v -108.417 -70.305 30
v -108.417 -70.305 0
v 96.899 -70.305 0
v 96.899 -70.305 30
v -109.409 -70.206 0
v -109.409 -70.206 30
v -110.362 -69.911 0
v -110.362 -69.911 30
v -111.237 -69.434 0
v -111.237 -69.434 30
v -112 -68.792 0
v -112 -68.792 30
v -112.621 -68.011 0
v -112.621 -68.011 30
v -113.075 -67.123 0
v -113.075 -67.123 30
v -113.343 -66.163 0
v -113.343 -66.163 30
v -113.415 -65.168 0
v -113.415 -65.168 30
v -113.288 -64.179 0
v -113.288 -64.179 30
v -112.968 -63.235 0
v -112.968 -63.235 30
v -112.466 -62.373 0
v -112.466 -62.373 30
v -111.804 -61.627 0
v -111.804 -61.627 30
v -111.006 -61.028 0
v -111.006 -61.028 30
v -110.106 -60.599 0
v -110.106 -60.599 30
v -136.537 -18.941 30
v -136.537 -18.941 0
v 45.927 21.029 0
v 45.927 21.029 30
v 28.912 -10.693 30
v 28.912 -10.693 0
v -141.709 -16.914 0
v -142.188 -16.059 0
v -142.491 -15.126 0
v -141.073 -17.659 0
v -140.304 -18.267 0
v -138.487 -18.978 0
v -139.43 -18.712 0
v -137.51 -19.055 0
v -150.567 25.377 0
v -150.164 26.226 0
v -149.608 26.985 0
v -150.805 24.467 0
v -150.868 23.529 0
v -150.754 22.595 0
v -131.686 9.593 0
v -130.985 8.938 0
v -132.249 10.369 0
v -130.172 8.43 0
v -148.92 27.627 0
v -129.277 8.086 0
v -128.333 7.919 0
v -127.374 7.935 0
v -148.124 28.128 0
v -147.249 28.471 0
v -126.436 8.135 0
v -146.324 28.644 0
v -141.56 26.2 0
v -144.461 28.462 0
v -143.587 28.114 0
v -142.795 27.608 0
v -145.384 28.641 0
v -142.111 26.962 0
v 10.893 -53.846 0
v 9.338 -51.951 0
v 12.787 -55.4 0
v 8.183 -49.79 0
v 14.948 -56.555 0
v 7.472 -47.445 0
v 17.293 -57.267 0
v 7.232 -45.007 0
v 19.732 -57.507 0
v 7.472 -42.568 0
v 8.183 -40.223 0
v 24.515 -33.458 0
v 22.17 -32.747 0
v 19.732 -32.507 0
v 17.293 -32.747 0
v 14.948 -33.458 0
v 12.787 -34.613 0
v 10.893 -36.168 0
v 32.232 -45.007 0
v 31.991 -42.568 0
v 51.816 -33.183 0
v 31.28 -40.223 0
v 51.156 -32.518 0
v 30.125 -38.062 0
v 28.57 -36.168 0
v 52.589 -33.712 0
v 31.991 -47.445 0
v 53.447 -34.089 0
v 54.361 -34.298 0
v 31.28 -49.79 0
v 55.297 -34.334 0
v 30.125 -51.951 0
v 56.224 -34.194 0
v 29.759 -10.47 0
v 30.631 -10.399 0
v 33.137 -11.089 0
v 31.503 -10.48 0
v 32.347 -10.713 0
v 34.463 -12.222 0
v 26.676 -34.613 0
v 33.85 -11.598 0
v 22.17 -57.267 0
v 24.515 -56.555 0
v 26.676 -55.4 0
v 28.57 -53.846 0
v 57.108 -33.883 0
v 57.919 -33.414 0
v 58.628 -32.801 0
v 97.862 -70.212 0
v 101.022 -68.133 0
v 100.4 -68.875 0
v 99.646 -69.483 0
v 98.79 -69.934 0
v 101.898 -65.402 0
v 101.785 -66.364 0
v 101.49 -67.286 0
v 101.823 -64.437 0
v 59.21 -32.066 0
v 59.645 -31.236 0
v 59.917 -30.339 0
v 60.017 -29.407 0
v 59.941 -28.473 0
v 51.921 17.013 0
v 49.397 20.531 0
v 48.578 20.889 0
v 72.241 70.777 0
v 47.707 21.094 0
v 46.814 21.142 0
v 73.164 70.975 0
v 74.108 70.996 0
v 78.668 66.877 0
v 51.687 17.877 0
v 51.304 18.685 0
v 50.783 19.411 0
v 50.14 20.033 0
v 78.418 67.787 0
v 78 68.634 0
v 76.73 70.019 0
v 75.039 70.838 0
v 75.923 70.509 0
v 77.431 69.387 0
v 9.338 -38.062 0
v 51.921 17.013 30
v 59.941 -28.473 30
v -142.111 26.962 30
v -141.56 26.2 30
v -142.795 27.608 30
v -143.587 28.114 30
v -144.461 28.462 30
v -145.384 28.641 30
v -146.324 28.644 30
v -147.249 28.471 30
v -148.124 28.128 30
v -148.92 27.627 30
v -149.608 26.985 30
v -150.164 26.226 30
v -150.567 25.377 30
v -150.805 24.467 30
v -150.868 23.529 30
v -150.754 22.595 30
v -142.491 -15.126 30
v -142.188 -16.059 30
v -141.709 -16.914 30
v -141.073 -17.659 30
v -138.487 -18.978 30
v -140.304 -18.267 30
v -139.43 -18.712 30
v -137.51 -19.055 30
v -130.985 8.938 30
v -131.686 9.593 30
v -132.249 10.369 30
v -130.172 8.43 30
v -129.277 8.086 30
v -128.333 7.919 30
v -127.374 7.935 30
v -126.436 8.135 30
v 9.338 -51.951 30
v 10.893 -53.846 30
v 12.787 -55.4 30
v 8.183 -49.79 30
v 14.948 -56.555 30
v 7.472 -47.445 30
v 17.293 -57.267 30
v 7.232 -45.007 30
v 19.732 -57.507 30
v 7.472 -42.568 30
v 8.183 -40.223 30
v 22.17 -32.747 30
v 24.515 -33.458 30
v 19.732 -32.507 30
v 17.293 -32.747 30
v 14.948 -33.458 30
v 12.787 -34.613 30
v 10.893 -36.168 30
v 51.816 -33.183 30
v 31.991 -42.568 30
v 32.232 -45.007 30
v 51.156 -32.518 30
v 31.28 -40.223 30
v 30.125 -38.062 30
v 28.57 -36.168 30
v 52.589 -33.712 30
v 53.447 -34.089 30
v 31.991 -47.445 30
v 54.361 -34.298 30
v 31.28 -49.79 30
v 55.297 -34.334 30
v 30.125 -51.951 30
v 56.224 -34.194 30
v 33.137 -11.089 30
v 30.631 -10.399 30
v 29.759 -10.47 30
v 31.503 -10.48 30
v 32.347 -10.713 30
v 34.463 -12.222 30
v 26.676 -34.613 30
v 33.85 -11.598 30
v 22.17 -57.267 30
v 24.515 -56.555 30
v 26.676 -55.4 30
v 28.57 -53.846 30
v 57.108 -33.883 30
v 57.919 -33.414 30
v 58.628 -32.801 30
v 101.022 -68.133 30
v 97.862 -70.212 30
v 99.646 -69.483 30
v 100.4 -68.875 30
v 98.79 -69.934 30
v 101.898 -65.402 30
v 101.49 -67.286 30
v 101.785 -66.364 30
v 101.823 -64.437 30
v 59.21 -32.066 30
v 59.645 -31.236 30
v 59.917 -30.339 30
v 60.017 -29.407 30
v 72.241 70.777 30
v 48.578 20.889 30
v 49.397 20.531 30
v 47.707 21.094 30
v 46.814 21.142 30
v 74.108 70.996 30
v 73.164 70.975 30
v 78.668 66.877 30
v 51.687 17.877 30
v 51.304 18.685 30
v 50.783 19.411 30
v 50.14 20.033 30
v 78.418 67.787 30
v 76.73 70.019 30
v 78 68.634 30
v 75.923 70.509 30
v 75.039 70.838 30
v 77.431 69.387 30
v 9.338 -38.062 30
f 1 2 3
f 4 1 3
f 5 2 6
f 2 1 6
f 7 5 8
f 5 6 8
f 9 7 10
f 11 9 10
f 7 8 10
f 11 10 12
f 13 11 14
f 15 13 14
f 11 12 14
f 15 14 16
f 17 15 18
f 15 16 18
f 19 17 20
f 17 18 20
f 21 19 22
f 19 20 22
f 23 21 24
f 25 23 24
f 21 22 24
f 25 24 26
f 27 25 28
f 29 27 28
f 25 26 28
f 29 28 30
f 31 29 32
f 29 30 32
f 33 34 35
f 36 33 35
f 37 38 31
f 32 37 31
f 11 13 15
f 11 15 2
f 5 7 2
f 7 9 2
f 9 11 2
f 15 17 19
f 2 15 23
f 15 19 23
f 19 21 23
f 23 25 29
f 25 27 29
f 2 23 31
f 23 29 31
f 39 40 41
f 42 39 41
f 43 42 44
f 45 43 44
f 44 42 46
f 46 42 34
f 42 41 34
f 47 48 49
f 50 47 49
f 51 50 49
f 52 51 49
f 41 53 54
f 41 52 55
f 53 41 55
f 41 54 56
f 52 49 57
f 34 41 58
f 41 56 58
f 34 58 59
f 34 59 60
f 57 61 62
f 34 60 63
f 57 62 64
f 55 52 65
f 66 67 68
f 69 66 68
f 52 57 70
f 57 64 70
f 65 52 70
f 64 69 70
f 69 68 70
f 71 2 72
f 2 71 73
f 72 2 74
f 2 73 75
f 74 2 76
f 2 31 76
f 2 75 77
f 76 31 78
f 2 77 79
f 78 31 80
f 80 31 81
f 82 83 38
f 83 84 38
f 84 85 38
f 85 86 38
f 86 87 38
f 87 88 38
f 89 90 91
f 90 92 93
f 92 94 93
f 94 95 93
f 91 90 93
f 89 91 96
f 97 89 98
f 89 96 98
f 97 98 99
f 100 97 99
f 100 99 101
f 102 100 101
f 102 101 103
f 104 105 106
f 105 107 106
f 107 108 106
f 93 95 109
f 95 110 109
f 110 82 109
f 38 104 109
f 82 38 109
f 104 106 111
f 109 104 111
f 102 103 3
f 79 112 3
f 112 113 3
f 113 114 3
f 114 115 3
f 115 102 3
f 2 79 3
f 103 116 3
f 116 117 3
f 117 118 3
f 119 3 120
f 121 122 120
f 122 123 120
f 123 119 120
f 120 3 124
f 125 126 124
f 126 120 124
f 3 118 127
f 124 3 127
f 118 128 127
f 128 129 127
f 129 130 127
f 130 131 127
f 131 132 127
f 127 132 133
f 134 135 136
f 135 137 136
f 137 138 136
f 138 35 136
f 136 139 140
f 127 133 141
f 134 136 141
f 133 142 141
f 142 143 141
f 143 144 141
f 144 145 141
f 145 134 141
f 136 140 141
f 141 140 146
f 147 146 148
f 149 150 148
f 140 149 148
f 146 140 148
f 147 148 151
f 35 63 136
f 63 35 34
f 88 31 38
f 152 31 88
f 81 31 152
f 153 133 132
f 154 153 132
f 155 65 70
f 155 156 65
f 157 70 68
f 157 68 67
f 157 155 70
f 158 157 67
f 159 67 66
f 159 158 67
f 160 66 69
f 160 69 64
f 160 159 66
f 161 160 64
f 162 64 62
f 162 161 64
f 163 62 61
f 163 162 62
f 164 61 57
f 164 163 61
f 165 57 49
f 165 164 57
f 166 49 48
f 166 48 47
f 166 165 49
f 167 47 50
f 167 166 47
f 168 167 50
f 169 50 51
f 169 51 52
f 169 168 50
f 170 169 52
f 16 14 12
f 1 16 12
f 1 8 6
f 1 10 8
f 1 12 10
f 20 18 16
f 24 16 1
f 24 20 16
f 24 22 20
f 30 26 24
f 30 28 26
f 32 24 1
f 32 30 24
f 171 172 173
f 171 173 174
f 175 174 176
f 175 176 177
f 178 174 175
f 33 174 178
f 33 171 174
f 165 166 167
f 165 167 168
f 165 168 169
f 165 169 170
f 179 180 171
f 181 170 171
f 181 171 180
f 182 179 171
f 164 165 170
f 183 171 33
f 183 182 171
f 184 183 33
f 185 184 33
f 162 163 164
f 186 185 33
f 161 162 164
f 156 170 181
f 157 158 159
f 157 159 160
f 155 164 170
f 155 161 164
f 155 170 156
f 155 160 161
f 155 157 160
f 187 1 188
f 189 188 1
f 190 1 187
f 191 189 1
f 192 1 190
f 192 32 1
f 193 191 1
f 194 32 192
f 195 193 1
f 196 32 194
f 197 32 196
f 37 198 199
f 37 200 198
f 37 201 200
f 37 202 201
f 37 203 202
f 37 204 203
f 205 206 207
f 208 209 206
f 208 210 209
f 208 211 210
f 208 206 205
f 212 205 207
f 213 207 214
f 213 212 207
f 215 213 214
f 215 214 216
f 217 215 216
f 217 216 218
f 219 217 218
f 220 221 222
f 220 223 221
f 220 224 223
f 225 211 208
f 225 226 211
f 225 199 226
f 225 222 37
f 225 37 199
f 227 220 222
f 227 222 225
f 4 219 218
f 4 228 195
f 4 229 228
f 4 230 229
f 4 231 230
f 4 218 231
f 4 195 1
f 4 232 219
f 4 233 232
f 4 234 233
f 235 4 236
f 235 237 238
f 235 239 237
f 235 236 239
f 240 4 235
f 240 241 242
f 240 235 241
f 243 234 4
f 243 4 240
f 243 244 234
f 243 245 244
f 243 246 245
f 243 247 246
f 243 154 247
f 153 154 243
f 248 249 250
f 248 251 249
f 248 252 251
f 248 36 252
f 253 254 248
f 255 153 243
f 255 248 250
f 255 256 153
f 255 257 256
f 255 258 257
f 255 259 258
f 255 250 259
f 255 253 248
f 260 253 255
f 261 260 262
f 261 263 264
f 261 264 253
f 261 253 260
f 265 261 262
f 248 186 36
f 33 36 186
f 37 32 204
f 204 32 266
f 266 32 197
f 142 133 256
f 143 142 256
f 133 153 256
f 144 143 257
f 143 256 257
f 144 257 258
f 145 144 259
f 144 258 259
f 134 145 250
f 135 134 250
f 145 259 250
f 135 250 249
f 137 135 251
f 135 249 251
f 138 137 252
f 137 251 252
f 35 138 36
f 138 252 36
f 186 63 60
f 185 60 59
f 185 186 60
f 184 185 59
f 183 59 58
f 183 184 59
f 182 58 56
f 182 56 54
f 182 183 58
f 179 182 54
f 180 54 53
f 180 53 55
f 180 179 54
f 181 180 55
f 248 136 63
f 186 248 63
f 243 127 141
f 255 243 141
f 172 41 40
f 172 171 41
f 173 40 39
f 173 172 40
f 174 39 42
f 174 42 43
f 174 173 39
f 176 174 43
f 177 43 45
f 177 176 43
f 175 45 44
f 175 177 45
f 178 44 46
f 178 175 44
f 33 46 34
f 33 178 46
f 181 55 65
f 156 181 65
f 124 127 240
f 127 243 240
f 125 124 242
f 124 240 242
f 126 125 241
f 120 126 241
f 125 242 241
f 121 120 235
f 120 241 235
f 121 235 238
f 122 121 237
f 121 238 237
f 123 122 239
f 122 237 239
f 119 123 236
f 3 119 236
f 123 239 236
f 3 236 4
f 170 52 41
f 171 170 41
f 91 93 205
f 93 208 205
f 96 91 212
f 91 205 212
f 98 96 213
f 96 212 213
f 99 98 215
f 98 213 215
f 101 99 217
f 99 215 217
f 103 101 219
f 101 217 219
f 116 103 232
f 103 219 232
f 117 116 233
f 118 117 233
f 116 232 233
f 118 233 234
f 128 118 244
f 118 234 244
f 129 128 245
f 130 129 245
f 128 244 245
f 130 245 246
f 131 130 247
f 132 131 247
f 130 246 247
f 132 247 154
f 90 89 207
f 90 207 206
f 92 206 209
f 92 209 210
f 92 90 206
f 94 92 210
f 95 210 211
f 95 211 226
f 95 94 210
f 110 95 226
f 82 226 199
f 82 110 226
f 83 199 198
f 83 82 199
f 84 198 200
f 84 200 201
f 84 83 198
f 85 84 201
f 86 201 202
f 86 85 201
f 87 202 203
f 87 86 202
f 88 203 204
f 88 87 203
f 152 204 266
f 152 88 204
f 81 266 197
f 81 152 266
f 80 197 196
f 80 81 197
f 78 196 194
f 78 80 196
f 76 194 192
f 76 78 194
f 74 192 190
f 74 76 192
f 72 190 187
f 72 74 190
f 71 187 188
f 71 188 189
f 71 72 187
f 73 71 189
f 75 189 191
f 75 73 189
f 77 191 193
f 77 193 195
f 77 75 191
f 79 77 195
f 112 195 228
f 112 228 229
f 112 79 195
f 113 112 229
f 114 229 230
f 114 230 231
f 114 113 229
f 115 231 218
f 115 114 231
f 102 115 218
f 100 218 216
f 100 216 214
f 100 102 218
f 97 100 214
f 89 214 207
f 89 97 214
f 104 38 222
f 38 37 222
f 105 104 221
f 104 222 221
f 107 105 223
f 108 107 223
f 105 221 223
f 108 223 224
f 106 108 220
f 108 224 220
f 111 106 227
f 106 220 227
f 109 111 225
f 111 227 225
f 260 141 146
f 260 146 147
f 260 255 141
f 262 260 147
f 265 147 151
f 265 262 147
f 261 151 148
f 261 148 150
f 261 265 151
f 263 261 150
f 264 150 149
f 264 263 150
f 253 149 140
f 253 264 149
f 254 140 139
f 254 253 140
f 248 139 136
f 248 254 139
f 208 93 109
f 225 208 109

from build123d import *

# Parameters (mm, degrees)
F0_R     = 12.5
F1_DEPTH = 30
F2_R     = 5


with BuildPart() as f1:
    # F0 (on Top) → F1 (new body)
    with BuildSketch(Plane.XY):
        Polygon((102.857415, -70.30526), (77.678429, 72.491864), (-130.231866, 6.937999), (-157.469519, 53.252321), (-141.420811, -20.010486), (51.016164, 22.144119), (63.246589, -47.218068), (32.226125, -9.502765), (-137.142585, -70.30526), align=None)
        with Locations((19.731589, -45.006815)):
            Circle(F0_R, mode=Mode.SUBTRACT)
    extrude(amount=F1_DEPTH)

    # F2
    f2_edges = [f1.edges().sort_by_distance(p)[0] for p in [
        (-130.231866, 6.937999, 15),
        (-157.469519, 53.252321, 15),
        (-141.420811, -20.010486, 15),
        (32.226125, -9.502765, 15),
        (63.246589, -47.218068, 15),
        (51.016164, 22.144119, 15),
        (-137.142585, -70.30526, 15),
        (77.678429, 72.491864, 15),
        (102.857415, -70.30526, 15),
    ]]
    fillet(f2_edges, radius=F2_R)


solid = f1.part
